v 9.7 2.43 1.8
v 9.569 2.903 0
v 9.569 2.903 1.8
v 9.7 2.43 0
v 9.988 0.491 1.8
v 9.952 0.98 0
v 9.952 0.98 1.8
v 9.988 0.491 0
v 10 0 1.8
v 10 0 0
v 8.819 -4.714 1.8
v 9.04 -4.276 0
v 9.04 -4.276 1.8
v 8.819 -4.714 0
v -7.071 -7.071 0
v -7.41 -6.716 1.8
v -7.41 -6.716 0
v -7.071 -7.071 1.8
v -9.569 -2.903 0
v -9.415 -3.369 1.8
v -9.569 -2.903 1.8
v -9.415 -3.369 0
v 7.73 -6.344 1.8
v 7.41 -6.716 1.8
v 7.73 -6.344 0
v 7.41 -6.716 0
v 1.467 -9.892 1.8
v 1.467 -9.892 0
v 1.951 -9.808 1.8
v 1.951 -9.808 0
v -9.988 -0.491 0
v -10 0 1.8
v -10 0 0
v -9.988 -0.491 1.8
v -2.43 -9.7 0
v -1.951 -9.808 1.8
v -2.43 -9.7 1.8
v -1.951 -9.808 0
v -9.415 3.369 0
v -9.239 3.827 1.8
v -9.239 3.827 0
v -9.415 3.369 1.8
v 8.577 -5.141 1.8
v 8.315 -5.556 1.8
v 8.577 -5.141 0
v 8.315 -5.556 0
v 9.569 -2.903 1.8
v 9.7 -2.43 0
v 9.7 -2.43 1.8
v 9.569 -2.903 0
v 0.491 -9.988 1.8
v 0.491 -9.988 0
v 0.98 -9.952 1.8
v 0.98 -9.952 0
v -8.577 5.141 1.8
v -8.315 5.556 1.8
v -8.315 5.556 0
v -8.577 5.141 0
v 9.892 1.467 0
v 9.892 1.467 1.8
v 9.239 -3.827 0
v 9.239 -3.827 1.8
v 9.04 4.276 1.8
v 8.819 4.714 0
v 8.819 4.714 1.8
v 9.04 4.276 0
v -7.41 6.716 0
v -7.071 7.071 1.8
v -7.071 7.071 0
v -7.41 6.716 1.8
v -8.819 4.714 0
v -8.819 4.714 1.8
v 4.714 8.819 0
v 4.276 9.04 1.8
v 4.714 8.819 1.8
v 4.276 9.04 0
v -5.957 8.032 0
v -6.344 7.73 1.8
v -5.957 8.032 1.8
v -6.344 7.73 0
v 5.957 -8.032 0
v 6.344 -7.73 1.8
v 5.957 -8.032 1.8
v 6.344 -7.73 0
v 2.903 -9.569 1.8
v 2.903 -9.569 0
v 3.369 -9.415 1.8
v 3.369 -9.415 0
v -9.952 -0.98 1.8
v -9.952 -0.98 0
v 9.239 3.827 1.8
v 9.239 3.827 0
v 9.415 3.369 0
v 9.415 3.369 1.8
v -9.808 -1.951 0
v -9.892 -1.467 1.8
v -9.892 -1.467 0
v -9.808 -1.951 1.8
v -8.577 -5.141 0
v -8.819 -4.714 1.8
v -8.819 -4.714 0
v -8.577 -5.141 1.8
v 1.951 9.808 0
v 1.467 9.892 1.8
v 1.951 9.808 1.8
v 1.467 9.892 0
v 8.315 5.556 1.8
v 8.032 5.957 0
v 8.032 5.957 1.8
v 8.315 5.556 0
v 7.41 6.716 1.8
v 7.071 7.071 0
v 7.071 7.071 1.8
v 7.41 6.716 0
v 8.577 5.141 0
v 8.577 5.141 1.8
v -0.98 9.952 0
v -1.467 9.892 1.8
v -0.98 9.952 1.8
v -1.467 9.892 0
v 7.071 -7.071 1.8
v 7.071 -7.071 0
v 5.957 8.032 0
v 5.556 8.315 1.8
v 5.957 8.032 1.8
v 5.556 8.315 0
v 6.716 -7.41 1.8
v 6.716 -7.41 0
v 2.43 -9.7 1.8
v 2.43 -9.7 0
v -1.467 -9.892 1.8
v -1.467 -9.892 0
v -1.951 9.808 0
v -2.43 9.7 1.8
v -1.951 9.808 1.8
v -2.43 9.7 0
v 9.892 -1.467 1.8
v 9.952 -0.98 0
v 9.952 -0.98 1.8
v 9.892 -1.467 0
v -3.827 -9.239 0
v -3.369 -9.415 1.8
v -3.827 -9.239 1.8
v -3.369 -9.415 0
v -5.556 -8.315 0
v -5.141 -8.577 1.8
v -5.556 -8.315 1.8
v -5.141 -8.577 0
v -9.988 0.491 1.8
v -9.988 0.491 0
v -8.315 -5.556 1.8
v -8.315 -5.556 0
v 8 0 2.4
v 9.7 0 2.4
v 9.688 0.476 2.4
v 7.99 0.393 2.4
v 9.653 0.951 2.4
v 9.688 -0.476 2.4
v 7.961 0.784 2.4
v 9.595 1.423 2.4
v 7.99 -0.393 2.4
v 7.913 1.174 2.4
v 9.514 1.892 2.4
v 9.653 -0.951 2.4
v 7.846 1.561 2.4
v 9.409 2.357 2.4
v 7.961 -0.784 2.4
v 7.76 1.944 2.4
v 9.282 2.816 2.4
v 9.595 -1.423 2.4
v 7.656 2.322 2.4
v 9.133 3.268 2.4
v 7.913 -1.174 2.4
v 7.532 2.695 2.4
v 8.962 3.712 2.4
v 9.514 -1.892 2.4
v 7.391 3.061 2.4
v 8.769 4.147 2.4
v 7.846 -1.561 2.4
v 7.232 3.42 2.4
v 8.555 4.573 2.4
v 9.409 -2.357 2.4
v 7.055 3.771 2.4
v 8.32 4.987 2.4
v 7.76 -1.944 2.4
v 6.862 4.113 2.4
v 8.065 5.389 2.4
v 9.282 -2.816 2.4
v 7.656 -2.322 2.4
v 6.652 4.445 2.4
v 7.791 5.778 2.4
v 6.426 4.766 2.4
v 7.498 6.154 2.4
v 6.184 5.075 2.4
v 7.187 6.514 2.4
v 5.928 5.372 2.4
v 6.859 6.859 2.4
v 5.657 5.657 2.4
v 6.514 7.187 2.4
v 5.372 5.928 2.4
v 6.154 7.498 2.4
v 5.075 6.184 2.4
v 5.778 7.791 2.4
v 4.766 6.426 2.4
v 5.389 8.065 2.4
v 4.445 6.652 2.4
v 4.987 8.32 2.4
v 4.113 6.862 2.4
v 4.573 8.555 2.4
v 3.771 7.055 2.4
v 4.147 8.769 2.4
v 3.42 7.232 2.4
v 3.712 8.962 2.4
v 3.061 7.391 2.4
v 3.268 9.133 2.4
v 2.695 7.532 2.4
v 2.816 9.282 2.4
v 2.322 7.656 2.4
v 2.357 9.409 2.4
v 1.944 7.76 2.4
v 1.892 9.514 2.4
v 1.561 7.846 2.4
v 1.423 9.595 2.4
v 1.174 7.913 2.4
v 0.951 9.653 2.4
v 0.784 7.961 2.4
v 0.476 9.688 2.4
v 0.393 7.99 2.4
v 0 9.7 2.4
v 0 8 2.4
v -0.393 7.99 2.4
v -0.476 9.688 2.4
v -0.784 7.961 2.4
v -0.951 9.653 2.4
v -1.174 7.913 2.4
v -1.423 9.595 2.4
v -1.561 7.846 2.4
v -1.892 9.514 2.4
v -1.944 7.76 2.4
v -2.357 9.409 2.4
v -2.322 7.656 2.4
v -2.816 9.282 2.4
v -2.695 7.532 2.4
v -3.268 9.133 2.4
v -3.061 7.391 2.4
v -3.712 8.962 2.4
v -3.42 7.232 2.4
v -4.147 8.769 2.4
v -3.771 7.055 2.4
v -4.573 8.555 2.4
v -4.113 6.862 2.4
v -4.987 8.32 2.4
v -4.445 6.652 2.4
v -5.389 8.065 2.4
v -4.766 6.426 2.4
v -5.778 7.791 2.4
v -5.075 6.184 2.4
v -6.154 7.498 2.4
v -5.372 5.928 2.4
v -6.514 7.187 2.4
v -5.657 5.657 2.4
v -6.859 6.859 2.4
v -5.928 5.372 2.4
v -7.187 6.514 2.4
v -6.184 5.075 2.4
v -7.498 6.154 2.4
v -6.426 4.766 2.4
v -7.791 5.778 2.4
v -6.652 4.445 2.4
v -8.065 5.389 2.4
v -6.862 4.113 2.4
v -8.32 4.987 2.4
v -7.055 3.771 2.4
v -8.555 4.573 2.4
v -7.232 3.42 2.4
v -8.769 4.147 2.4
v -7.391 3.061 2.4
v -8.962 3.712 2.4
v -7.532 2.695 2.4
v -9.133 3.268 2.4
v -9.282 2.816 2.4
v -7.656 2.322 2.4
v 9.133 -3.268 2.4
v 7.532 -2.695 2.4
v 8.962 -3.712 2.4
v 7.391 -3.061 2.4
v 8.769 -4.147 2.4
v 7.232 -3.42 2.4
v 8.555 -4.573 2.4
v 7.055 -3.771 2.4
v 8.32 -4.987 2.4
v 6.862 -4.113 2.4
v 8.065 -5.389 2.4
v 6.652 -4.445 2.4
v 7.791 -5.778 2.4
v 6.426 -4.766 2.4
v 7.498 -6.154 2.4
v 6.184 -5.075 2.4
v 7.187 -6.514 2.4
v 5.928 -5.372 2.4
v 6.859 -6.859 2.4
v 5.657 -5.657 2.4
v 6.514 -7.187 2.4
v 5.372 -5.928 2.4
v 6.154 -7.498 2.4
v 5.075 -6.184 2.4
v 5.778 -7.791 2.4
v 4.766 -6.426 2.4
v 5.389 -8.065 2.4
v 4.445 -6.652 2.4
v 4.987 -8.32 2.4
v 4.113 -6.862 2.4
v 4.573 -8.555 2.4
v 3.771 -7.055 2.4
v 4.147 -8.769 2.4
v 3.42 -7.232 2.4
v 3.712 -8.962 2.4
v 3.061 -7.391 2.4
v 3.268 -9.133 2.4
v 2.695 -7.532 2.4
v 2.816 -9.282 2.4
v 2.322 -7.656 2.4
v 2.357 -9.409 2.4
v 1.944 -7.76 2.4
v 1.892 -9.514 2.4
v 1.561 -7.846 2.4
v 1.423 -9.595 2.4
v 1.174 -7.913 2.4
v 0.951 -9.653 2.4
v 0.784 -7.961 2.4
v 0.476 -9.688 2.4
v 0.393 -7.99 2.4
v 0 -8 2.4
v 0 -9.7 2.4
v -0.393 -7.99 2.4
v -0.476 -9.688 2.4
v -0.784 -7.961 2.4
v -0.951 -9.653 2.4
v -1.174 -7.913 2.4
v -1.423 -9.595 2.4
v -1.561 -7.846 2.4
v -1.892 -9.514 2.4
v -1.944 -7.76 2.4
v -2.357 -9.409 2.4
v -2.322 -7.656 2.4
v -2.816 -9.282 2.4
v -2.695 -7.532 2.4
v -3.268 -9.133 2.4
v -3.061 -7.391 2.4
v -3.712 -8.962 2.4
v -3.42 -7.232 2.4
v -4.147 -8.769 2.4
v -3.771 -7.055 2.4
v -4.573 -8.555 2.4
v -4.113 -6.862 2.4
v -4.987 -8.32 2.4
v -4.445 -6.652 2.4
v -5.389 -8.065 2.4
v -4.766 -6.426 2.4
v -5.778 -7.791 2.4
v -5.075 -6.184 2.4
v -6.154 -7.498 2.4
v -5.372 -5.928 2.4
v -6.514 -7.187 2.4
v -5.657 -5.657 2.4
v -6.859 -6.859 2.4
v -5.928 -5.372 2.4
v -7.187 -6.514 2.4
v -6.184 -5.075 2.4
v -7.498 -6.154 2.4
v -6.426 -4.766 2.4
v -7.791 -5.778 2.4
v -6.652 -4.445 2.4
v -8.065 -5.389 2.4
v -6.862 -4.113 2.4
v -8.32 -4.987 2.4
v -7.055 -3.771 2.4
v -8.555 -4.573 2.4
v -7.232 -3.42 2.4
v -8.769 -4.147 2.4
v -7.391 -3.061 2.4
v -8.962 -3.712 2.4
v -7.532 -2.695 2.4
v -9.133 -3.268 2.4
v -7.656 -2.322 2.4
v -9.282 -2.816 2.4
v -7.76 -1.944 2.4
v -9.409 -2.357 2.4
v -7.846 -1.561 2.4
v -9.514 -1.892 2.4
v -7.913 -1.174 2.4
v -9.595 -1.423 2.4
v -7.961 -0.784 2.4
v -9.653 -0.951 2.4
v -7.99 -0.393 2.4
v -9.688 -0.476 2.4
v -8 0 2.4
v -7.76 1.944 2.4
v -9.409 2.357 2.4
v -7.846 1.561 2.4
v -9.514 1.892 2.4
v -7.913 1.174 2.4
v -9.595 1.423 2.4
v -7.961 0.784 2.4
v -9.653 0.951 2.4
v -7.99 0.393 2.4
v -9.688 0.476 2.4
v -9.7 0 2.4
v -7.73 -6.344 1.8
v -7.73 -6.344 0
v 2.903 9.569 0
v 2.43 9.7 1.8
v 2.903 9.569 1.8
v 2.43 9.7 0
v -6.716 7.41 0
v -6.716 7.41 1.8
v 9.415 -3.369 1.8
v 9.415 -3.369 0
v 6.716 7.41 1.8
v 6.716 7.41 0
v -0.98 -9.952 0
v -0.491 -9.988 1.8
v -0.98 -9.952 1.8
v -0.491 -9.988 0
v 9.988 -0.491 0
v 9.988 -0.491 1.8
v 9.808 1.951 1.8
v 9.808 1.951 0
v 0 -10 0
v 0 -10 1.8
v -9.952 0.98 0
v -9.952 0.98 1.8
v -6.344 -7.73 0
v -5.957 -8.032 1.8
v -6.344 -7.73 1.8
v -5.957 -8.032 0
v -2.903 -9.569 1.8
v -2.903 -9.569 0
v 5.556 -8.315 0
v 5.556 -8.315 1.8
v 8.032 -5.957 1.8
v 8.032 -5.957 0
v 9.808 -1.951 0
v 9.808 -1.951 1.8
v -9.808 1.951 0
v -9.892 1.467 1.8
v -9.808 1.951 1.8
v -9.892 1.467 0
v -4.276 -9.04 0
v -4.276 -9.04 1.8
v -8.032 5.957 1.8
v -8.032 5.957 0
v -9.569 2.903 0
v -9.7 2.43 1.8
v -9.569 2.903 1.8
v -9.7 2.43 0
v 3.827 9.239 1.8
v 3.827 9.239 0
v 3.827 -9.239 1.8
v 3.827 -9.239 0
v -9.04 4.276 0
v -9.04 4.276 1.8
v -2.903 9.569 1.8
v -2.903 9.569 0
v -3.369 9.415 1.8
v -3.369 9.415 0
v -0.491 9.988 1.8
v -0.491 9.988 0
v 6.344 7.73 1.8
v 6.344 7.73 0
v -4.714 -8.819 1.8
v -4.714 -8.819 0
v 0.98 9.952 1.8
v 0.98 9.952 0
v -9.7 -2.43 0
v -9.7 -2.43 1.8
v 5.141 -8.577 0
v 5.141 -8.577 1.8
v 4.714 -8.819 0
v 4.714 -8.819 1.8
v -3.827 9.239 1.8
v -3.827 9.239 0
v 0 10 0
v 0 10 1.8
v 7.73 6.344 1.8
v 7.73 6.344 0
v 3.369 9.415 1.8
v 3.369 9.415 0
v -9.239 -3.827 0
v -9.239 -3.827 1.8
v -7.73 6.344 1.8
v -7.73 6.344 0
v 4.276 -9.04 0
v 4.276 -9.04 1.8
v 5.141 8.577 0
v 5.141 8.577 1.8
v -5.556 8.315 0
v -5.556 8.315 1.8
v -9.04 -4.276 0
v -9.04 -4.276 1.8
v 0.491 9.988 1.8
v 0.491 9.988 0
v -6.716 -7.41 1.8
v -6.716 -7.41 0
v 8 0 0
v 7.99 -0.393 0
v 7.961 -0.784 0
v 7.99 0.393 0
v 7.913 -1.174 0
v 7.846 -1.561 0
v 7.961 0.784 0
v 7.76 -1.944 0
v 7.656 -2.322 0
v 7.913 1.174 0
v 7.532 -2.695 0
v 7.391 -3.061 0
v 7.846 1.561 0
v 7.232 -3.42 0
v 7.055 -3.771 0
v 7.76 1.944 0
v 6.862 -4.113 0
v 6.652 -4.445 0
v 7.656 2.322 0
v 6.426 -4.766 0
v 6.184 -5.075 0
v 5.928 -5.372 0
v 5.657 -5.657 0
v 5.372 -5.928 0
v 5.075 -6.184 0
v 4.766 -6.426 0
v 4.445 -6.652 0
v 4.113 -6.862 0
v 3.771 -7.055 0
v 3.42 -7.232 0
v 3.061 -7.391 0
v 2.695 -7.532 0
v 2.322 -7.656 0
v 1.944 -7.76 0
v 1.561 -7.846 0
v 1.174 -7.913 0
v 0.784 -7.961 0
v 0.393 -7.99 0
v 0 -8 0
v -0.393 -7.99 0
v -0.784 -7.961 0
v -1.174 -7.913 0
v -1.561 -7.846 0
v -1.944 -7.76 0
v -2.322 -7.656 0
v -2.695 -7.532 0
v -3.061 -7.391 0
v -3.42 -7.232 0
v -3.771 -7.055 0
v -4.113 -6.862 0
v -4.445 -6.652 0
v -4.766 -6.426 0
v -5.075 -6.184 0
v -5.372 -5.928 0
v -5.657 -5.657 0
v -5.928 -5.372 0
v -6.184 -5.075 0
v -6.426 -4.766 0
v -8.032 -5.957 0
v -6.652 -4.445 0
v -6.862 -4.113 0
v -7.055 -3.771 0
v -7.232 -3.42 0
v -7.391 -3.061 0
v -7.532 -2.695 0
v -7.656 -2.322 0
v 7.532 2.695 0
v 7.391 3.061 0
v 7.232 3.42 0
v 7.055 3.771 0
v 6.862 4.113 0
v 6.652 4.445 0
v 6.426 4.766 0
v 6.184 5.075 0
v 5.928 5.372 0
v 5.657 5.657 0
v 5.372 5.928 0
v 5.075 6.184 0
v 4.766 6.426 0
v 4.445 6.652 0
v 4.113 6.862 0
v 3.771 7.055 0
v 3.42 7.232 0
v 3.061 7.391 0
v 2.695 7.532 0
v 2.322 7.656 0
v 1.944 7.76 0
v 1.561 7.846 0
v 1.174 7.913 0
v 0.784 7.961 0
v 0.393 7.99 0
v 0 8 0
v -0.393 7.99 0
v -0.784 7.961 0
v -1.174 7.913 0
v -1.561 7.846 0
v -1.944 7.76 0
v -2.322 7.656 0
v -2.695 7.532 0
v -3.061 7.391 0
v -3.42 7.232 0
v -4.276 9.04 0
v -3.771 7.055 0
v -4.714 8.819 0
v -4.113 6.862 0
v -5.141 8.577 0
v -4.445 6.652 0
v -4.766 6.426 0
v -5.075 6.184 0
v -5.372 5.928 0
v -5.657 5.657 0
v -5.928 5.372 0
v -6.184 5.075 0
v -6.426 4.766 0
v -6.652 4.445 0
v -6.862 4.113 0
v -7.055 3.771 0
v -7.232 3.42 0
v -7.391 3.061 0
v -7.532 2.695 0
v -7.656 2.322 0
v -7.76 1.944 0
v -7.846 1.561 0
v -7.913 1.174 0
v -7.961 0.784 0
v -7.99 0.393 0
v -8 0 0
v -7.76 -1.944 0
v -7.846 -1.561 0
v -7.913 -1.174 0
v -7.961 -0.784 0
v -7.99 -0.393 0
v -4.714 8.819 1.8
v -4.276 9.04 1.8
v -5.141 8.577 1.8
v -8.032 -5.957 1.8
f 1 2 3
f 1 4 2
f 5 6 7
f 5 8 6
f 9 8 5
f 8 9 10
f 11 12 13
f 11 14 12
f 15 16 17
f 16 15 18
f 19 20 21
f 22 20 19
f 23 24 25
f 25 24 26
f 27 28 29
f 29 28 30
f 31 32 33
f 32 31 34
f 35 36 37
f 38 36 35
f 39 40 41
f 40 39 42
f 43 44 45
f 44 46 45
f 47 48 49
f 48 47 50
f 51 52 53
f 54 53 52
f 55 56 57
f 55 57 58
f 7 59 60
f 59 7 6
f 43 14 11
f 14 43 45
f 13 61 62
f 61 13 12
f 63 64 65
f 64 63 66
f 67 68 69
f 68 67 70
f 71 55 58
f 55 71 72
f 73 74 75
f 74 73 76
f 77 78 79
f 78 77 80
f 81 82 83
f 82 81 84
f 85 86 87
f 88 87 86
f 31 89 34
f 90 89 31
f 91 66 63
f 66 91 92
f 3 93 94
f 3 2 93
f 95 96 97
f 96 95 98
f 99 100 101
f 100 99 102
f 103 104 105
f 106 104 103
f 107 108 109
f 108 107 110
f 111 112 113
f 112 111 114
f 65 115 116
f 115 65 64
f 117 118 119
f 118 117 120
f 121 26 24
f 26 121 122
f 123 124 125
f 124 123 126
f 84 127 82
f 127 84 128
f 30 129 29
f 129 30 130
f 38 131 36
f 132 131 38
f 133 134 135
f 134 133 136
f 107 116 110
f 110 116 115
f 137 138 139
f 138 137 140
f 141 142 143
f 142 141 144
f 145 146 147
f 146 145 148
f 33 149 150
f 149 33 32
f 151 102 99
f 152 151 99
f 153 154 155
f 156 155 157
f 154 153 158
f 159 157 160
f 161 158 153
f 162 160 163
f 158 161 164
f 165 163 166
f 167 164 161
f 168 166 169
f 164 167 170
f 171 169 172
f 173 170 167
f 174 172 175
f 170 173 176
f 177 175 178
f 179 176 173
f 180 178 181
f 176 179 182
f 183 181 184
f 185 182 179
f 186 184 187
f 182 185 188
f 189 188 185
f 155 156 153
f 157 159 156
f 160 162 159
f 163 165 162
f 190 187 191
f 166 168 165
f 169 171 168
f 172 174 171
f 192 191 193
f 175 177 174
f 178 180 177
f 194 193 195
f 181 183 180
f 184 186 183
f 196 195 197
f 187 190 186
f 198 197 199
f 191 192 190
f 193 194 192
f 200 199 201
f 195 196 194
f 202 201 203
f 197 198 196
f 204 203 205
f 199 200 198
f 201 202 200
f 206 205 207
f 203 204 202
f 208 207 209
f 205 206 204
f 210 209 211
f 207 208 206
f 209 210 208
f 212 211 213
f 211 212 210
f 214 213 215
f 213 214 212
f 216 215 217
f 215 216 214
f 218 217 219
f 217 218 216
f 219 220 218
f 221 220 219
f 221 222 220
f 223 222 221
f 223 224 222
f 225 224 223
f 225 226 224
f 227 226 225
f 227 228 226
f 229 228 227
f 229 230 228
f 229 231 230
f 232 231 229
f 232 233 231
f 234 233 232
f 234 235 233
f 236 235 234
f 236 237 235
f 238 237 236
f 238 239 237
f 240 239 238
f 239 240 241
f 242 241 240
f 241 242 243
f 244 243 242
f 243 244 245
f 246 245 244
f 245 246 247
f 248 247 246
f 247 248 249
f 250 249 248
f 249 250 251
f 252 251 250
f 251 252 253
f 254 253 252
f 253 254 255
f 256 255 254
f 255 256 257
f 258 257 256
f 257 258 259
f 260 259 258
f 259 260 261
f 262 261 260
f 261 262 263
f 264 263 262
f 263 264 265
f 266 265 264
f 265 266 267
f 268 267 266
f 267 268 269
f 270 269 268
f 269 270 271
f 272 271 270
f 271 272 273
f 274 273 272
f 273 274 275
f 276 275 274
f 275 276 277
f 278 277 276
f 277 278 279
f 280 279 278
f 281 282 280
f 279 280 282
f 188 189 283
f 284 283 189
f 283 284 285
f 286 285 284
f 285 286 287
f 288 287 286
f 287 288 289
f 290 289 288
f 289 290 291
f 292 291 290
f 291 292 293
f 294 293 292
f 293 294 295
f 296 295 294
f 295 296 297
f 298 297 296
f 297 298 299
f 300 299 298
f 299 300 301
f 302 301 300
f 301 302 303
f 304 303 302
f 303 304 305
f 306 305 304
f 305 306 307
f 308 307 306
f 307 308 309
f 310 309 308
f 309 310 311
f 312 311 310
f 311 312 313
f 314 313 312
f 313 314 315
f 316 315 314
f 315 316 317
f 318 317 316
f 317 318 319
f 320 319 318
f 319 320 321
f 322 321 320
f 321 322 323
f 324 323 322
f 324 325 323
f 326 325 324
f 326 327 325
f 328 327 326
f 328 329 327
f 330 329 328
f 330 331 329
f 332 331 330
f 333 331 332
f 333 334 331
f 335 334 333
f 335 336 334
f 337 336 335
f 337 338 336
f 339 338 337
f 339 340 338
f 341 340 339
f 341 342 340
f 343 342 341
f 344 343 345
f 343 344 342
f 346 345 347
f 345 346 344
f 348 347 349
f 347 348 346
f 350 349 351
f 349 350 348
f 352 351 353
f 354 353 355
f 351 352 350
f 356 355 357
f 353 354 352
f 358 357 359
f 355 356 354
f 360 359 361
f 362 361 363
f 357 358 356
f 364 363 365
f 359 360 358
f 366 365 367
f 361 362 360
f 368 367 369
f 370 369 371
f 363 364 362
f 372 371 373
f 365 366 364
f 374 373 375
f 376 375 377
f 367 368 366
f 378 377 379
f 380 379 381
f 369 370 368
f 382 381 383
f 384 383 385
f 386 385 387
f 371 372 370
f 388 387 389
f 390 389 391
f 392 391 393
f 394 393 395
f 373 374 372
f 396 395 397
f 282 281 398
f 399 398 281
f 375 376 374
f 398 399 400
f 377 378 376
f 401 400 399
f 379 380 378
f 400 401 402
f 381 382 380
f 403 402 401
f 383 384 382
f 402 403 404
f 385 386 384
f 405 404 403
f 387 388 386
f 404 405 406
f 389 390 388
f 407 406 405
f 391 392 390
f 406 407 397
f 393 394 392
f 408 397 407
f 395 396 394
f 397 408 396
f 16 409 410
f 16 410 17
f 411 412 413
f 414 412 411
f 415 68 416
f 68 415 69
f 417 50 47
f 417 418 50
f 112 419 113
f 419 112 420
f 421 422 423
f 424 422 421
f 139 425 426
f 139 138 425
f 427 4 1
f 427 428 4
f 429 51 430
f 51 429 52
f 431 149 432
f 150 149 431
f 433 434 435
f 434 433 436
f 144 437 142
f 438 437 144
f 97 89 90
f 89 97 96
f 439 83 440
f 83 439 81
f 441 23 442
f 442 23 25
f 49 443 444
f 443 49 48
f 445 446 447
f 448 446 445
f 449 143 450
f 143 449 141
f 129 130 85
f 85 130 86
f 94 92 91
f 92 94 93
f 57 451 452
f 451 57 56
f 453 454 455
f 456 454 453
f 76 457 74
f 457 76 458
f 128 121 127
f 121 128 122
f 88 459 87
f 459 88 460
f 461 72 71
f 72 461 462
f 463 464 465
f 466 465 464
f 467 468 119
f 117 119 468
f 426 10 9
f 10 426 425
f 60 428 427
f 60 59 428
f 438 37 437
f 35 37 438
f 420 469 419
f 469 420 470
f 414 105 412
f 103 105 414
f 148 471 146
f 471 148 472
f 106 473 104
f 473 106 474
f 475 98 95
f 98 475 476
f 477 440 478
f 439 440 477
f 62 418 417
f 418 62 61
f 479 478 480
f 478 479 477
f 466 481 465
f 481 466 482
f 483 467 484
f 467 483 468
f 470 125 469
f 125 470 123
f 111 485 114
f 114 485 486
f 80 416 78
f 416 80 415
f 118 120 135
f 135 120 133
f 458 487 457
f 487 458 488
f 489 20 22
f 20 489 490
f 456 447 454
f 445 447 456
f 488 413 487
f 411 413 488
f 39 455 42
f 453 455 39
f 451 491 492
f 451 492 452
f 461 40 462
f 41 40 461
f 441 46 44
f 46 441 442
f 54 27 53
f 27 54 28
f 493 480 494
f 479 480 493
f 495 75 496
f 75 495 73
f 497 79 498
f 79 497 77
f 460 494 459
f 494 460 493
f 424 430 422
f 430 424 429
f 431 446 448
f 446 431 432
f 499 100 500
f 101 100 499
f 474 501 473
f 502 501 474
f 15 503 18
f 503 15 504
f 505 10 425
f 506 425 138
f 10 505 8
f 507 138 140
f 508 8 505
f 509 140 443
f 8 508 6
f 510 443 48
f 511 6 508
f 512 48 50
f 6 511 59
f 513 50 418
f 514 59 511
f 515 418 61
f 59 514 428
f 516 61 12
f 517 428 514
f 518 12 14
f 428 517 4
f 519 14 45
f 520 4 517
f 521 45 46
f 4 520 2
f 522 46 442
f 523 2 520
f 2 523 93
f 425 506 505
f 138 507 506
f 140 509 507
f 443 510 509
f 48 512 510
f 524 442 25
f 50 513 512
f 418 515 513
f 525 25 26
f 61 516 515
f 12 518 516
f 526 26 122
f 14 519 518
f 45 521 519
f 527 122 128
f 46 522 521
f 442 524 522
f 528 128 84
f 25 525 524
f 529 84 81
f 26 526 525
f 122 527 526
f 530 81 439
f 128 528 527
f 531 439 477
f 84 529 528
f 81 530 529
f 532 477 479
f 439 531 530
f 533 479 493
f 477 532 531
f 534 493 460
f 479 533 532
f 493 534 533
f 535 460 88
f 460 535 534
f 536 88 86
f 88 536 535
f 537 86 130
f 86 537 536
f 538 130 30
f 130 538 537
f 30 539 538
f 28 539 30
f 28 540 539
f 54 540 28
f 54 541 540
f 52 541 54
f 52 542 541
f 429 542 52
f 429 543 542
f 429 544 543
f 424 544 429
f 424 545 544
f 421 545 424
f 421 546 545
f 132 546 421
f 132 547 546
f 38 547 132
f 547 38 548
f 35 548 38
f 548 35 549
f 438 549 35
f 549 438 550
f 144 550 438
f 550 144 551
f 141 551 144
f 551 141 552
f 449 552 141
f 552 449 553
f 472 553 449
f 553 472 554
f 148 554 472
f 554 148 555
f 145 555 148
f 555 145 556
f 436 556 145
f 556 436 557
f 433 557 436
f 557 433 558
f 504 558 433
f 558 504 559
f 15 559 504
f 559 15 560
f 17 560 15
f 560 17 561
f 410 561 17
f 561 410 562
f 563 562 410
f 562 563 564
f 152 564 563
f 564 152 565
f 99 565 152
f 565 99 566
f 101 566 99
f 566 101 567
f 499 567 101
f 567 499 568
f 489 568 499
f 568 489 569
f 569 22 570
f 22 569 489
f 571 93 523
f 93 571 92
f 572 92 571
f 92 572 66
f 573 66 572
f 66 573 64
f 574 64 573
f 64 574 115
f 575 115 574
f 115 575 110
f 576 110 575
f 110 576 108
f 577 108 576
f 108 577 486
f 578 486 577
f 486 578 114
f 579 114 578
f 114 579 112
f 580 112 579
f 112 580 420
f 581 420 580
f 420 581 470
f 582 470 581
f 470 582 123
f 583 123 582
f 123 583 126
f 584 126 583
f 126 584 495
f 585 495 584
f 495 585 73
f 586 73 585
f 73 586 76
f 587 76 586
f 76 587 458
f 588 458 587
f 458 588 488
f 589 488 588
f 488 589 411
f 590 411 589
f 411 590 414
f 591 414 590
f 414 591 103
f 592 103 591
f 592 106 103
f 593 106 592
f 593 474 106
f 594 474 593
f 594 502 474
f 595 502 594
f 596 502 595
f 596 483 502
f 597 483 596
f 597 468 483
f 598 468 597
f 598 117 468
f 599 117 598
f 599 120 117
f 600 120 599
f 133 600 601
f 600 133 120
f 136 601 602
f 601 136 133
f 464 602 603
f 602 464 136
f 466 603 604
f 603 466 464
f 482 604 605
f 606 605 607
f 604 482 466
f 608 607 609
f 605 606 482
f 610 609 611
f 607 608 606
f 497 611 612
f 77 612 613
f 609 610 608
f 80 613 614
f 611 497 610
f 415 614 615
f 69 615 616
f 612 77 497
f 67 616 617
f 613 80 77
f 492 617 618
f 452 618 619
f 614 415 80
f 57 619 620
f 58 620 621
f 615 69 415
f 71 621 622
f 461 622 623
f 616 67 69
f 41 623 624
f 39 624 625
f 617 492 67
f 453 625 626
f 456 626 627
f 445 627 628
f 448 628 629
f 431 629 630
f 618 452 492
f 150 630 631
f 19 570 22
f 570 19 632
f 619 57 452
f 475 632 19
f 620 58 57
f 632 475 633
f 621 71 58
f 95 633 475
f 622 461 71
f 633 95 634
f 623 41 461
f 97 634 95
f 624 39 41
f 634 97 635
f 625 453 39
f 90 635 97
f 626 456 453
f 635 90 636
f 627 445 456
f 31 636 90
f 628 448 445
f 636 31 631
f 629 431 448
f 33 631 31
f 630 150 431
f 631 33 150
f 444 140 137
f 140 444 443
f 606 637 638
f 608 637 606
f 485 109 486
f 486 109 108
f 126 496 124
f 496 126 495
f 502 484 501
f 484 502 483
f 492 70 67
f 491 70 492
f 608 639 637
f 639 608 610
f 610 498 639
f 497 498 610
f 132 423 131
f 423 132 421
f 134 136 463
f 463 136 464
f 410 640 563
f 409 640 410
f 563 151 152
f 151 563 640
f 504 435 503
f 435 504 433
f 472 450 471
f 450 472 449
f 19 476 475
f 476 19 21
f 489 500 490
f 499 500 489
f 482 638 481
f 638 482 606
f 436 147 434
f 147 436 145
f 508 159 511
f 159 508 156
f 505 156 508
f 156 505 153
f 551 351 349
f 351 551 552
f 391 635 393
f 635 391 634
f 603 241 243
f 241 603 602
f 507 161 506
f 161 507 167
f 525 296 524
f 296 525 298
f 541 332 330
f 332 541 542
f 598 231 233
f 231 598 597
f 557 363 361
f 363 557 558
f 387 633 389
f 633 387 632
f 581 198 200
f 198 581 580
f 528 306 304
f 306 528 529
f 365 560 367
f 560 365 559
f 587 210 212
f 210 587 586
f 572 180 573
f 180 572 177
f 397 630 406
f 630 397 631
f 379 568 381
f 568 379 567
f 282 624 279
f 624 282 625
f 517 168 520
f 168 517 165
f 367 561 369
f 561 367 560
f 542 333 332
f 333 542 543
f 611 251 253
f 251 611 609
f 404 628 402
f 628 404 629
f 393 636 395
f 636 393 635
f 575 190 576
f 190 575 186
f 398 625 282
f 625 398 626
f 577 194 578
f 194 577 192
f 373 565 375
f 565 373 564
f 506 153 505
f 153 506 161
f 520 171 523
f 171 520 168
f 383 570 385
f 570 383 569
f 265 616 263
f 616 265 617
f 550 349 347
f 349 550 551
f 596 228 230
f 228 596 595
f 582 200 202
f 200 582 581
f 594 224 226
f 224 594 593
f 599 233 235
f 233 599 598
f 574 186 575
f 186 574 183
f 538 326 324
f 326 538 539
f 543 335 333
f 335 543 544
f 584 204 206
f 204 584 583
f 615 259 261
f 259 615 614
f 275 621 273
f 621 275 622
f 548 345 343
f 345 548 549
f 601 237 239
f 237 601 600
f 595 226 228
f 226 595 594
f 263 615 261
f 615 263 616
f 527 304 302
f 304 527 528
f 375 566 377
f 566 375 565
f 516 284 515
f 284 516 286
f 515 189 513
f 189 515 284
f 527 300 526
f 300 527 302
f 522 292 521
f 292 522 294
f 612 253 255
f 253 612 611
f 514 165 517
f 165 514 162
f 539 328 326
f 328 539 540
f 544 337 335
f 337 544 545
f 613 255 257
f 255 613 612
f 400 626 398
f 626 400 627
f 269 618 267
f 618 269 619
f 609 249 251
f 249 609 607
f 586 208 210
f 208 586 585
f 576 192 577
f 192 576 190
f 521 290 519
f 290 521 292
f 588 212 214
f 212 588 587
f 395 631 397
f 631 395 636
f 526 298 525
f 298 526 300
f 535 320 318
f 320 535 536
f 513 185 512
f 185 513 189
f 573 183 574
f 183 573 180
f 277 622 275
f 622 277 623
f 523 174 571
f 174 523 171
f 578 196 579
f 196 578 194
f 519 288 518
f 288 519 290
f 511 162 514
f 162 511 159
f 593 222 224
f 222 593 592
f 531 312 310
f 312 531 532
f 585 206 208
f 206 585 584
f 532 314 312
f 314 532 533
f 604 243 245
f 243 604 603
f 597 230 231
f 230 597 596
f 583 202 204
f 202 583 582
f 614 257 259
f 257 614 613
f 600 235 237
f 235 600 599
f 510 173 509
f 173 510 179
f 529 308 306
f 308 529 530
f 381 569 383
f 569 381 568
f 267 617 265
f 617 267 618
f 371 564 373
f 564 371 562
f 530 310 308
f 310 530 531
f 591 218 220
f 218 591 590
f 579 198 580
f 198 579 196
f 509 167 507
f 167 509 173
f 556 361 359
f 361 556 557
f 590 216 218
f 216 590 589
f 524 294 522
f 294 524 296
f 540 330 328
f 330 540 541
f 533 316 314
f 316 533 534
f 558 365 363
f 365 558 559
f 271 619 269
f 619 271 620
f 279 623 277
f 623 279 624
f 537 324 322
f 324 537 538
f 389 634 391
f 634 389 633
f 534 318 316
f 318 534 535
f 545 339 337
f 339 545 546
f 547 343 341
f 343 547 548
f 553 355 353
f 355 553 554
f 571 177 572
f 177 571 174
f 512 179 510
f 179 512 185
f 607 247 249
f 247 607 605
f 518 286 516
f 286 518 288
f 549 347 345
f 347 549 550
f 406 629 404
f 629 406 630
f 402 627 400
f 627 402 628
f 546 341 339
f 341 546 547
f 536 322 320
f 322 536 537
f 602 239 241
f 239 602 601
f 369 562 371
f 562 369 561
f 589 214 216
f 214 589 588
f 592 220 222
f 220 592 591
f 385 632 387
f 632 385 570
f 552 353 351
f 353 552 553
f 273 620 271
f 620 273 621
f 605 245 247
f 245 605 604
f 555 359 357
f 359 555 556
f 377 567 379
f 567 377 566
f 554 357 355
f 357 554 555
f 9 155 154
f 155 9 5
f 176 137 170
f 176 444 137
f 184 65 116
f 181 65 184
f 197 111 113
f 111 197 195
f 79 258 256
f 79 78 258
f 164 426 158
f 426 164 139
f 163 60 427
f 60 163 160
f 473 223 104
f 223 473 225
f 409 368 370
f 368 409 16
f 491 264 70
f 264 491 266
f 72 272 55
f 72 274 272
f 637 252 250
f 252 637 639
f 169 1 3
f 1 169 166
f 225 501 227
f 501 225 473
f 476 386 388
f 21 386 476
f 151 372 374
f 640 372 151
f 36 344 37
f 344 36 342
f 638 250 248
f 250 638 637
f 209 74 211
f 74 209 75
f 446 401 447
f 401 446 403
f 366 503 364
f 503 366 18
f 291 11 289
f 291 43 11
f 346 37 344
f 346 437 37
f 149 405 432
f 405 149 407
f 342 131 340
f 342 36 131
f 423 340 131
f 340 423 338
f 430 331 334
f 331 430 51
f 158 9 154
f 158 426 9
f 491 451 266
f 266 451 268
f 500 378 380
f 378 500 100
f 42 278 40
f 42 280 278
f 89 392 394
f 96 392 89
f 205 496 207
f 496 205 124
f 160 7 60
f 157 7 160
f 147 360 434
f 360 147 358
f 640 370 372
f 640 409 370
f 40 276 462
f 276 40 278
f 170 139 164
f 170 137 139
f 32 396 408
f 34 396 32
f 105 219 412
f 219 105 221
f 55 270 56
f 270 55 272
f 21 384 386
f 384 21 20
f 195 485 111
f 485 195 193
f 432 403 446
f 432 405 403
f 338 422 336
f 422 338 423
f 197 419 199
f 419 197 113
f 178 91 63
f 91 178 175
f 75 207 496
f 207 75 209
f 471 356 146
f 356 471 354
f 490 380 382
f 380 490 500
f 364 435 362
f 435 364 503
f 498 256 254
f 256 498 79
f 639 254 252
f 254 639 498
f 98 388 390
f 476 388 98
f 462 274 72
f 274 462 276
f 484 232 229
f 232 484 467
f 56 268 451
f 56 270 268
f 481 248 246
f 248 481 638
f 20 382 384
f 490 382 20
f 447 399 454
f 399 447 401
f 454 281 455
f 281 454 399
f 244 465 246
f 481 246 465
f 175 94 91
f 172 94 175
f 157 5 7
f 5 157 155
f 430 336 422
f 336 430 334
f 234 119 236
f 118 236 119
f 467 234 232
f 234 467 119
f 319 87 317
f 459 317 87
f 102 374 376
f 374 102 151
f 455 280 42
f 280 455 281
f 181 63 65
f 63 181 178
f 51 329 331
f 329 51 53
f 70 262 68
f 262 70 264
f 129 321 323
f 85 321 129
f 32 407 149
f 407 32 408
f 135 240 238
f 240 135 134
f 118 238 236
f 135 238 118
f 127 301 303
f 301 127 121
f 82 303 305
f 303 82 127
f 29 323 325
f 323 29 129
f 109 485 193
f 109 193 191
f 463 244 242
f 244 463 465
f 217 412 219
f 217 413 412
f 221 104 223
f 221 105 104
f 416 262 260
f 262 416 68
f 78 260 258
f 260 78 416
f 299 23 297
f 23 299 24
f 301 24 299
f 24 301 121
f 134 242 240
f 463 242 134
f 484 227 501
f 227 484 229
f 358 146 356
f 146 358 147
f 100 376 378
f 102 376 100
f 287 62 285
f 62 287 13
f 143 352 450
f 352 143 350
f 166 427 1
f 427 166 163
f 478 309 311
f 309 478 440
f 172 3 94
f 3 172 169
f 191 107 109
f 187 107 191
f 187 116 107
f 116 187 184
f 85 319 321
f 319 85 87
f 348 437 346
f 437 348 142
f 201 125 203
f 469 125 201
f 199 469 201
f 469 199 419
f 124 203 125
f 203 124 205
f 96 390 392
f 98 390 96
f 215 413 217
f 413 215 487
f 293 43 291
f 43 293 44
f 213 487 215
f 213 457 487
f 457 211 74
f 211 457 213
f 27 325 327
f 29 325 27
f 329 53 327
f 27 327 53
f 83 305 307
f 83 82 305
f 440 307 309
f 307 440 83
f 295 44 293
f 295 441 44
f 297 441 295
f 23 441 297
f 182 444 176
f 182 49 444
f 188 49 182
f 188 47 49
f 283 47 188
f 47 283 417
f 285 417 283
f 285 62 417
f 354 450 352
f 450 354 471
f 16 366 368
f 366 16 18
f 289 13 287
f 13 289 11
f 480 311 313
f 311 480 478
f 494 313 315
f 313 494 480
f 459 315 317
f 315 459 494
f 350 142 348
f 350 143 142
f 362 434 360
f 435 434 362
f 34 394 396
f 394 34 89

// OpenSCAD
// Circular saw blade arbor reduction adapter ring
// Default values are to fit a 20mm saw blade into a 16mm (5/8") arbor
// Adjust the defaults in the customizer view

/* [Saw Blade Arbor Reducer Bushing] */
blade_thickness=2.4; // [0.1:0.1:40]

// Arbor of the blade [mm]
outer_d=20; // [0.1:0.1:40]

// Arbor of the saw [mm]
inner_d=16; // [0.1:0.1:40]

// Bushing insertion easment [mm]
bevel=0.6; // [0:0.1:5]

/* [Hidden] */
$fn=128;
defeather=0.001;


assert(outer_d>inner_d);

intersection() {
    difference() {
        cylinder(d=outer_d, h=blade_thickness);
        translate([0,0,-defeather])
            cylinder(d=inner_d, h=blade_thickness+2*defeather);
    }
    
    cone_d = 2*outer_d - bevel;
    cone_z = (blade_thickness-bevel/2) - sqrt(cone_d*cone_d/4);
    
    color("red") translate([0, 0, cone_z])
        cylinder(d1=cone_d, d2=0, h=cone_d);
}
